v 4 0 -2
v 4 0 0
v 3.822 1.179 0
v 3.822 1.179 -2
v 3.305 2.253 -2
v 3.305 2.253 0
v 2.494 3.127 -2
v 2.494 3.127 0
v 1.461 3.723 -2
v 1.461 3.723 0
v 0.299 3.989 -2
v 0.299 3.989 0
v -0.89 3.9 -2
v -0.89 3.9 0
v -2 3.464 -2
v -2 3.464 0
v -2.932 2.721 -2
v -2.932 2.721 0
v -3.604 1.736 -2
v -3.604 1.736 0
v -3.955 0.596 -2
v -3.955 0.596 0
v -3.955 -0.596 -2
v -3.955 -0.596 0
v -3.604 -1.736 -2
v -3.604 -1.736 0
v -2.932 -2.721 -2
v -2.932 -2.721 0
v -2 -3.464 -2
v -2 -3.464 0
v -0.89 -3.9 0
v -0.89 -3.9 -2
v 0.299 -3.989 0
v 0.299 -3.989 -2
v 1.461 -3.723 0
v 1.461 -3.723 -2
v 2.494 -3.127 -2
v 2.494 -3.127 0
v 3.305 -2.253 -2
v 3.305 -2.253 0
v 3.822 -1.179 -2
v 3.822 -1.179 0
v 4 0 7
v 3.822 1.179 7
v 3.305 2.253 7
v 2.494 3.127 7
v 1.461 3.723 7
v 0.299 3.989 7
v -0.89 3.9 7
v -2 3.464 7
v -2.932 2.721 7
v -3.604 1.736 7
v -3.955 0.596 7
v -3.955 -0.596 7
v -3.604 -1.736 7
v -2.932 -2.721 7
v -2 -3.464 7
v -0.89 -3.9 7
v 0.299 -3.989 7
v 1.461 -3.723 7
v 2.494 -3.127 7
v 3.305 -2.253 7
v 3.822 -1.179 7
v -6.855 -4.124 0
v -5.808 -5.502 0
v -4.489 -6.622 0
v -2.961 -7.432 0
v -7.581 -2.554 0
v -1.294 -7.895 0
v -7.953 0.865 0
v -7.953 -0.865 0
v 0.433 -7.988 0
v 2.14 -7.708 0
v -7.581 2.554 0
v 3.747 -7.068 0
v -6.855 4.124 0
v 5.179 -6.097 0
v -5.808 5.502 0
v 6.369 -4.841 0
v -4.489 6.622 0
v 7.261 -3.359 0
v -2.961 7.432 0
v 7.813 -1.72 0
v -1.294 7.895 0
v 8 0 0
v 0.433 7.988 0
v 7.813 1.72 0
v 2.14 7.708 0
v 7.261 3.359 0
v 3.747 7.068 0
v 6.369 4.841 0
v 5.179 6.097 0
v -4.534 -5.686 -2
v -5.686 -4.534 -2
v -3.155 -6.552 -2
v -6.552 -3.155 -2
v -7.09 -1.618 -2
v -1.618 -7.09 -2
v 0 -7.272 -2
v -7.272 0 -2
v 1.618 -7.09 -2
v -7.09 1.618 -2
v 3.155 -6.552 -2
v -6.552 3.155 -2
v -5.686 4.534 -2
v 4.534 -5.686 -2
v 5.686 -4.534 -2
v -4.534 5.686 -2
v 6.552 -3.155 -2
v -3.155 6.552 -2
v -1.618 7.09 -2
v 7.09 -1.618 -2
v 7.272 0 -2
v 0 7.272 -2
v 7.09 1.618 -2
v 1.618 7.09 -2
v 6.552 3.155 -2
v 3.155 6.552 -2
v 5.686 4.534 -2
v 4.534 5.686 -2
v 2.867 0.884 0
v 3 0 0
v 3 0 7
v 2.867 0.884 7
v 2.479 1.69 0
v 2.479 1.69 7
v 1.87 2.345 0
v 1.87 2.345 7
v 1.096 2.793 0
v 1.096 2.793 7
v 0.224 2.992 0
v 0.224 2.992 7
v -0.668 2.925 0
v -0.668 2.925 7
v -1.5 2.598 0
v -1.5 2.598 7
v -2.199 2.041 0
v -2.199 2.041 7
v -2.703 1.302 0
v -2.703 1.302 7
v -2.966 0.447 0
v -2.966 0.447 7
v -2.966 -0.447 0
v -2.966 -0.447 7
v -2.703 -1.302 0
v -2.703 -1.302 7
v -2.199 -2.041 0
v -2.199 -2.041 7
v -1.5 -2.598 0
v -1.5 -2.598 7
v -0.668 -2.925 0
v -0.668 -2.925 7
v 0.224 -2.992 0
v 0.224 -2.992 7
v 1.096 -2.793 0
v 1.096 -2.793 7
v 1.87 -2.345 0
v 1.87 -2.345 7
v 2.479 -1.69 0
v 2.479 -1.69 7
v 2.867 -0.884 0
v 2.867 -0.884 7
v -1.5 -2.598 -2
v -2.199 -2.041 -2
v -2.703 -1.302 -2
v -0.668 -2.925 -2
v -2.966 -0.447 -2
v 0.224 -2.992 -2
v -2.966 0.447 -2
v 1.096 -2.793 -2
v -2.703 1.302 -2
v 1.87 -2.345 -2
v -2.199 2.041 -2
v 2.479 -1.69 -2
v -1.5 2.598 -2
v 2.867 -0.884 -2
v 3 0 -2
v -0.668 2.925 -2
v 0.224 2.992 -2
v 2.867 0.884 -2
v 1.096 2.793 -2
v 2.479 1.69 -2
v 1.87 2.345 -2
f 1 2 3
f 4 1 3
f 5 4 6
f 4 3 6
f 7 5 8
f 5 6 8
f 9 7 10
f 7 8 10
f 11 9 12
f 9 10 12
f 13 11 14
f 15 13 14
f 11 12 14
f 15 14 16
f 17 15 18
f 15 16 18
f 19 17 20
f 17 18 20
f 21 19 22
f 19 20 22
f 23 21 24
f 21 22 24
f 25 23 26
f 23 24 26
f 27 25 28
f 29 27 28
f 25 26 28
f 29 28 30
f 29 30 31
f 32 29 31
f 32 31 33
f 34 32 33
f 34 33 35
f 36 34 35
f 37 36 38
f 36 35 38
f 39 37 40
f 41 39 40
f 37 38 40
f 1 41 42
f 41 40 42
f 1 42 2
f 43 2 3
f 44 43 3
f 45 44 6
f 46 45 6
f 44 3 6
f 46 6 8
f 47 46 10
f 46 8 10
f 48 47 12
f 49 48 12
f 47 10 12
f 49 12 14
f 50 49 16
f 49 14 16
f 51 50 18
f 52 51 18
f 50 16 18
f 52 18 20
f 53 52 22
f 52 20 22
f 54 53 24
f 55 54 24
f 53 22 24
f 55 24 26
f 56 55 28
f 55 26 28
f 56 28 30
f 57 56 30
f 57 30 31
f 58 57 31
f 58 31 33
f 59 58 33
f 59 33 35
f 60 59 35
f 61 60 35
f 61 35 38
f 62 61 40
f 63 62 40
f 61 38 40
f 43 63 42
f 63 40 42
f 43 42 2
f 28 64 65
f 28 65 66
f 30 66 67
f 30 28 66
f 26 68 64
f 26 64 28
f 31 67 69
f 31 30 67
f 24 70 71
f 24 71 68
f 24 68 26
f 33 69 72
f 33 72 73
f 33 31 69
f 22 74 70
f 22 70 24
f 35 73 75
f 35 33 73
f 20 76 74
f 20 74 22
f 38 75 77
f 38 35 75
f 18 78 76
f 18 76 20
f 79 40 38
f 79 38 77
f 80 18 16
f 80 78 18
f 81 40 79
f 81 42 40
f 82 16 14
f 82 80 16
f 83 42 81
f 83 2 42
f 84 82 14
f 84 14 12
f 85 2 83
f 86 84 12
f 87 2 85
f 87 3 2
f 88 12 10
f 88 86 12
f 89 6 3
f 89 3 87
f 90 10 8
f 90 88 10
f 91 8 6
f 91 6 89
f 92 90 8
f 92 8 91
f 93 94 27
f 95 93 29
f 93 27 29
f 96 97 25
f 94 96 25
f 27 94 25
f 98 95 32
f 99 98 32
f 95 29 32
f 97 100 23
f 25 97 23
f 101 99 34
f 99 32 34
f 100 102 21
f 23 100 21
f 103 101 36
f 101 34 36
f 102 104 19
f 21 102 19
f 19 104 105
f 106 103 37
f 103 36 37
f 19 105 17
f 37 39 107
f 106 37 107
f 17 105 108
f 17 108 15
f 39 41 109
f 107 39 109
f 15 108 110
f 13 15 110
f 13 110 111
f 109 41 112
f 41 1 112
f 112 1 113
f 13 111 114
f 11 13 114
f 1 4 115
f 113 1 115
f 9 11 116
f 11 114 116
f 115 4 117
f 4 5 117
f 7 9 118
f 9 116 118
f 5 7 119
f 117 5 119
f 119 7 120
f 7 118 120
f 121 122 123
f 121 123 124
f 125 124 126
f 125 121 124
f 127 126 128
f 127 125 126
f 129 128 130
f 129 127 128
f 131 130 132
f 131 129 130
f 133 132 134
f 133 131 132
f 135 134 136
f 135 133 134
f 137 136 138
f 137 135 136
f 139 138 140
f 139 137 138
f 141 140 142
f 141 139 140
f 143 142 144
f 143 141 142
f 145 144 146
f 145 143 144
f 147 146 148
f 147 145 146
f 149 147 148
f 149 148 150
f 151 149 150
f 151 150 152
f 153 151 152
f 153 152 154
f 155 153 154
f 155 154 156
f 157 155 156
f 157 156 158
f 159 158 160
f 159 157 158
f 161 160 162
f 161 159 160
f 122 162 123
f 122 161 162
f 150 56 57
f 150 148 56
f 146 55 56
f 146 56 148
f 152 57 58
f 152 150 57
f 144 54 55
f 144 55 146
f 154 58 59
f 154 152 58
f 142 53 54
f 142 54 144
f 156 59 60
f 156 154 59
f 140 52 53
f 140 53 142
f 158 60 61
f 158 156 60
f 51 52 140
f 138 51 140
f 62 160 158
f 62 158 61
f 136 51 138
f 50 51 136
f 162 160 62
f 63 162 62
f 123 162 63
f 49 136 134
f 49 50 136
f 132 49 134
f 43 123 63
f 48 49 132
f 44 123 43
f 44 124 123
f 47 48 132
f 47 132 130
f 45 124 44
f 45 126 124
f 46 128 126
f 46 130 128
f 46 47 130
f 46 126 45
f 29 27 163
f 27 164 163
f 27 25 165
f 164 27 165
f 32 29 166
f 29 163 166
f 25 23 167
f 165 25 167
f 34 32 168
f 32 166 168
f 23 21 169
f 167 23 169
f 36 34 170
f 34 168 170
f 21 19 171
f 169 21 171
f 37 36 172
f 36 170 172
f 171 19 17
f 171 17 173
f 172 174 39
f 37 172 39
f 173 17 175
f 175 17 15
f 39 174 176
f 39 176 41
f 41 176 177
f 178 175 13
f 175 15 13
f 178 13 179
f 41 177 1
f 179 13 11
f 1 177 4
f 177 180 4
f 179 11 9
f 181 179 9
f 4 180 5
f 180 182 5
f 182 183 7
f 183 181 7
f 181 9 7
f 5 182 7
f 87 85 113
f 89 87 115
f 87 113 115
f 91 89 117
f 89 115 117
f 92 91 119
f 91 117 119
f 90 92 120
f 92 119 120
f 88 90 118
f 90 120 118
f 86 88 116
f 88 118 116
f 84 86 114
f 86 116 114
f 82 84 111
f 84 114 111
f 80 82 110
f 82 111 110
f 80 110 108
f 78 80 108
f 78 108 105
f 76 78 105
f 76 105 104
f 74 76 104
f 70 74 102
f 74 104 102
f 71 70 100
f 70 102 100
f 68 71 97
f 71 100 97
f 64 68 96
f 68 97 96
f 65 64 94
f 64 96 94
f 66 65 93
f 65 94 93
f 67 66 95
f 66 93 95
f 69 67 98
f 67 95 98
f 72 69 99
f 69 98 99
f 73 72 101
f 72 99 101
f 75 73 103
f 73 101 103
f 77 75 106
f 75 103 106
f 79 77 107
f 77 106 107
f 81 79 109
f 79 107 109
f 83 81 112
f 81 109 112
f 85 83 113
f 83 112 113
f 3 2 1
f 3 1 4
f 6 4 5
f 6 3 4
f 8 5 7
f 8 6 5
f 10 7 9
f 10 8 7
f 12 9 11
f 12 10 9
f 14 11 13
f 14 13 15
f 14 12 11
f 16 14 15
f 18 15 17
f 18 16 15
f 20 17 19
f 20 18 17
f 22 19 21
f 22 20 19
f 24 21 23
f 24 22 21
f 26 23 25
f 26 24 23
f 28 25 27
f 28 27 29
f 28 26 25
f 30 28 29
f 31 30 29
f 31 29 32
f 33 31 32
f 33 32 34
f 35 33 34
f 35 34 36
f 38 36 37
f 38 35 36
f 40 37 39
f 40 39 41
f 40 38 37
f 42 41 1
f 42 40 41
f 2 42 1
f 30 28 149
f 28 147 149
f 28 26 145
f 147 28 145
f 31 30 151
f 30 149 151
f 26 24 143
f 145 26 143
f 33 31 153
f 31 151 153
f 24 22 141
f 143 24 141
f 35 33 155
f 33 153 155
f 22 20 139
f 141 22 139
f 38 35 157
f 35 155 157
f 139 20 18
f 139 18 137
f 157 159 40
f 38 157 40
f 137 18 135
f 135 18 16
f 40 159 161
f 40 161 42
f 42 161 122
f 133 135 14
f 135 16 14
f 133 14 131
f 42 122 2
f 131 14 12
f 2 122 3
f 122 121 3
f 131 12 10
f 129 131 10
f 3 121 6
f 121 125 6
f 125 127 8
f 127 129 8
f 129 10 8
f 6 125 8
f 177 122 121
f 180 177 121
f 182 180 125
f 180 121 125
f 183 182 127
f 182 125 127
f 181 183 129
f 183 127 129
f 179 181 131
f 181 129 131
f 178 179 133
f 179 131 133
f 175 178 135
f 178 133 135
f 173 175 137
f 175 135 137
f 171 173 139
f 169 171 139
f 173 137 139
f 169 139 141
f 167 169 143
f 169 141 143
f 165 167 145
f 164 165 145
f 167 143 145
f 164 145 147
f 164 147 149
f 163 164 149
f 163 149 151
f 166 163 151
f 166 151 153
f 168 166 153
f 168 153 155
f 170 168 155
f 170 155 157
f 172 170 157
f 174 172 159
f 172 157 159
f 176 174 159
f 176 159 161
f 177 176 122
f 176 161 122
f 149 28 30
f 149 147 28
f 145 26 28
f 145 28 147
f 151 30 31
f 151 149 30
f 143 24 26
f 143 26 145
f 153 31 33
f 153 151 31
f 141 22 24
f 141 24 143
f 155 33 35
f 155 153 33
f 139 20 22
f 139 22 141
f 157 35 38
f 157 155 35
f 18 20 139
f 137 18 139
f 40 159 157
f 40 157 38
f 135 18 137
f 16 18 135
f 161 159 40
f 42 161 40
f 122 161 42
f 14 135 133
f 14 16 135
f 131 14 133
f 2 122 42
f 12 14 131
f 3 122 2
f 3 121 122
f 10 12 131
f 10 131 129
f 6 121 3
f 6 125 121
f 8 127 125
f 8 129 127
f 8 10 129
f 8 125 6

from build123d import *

# Parameters (mm, degrees)
F0_R     = 4
F0_R_2   = 3
F1_DEPTH = 7
F0_R_3   = 8
F2_DEPTH = 2
F3_SIZE2 = 0.72793
F3_SIZE  = 1.99999
F4_DEPTH = 2


# Not quite as in the source:
# - a fillet or chamfer is up to 0.001 mm smaller than in the source, because OpenCascade refuses the exact size


with BuildPart() as f1:
    # F0 (on Top) → F1 (new body)
    with BuildSketch(Plane.XY):
        Circle(F0_R)
        Circle(F0_R_2, mode=Mode.SUBTRACT)
    extrude(amount=F1_DEPTH)


with BuildPart() as f2:
    # F0 (on Top) → F2 (new body)
    with BuildSketch(Plane.XY):
        Circle(F0_R_3)
        Circle(F0_R, mode=Mode.SUBTRACT)
    extrude(amount=-F2_DEPTH)

    # F3 (size 2 and 0.7279404685 in the source; OpenCascade refuses exactly that, so slightly less here)
    f3_edges = [f2.edges().sort_by_distance(p)[0] for p in [
        (-8, 0, -2),
    ]]
    f3_side = f2.faces().sort_by_distance((-8, 0, -1))[0]
    chamfer(f3_edges, length=F3_SIZE, length2=F3_SIZE2, reference=f3_side)


with BuildPart() as f4:
    # F4 (new): a face of the model
    f4_faces = [f1.part.faces().sort_by_distance(p)[0] for p in [
        (-3.886862915, 0, 0),
    ]]
    extrude(f4_faces, amount=F4_DEPTH)


solid = Compound([f1.part, f2.part, f4.part])
